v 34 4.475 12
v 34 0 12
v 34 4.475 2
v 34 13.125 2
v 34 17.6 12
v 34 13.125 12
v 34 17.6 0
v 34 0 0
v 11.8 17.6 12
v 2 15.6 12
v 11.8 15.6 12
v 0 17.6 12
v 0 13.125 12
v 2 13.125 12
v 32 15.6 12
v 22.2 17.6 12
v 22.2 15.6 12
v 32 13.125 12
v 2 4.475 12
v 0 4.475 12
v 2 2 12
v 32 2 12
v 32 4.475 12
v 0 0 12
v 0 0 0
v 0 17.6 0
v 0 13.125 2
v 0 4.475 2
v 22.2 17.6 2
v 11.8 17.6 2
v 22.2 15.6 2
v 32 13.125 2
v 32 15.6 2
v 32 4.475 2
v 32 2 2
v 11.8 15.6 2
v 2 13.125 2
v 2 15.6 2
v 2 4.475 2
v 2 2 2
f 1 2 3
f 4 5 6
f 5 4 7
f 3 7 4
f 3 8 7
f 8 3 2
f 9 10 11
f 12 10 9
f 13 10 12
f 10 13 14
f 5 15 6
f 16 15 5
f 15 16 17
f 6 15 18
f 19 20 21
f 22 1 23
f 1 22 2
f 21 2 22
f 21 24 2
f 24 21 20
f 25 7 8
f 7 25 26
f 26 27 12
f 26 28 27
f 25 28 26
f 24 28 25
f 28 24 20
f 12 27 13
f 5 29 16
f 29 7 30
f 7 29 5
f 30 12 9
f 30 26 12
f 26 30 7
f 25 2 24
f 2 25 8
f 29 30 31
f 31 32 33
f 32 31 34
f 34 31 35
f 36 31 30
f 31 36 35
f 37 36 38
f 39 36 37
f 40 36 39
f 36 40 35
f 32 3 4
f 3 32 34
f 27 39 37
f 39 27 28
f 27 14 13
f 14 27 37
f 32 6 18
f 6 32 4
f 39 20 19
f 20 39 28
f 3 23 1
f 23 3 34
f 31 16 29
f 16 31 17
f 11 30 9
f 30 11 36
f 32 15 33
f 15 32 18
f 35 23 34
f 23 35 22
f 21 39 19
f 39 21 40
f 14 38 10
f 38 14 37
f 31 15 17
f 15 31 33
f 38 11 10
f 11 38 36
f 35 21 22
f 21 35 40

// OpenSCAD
function centering_offset (outer_dimension, inner_dimension) =
(outer_dimension - inner_dimension) / 2;

module irsensor_bracket (
    screw_bracket_width = 8.65,
    plug_width = 10.4,
    inner_breadth = 13.6,
    inner_length = 30,
    depth = 10,
    wall_thickness = 2,
)
{
    outer_length = inner_length + wall_thickness * 2;
    outer_breadth = inner_breadth + wall_thickness * 2;

    difference () {
        // main body
        cube (size=[outer_length, outer_breadth, depth + wall_thickness]);

        // screw bracket holes
        translate ([
                -0.1,
                centering_offset (outer_breadth, screw_bracket_width),
                wall_thickness
            ])
        cube ([outer_length + 0.2, screw_bracket_width, depth + 0.1]);

        // hole for electric plug
        translate ([
                centering_offset (outer_length, plug_width),
                outer_breadth - wall_thickness - 0.1,
                wall_thickness
            ])
        cube ([plug_width, wall_thickness + 0.2, depth + 0.1]);

        // hole for the ir sensor itself
        translate ([wall_thickness, wall_thickness, wall_thickness])
        cube ([inner_length, inner_breadth, depth + 0.1]);
    }
}

irsensor_bracket ();
